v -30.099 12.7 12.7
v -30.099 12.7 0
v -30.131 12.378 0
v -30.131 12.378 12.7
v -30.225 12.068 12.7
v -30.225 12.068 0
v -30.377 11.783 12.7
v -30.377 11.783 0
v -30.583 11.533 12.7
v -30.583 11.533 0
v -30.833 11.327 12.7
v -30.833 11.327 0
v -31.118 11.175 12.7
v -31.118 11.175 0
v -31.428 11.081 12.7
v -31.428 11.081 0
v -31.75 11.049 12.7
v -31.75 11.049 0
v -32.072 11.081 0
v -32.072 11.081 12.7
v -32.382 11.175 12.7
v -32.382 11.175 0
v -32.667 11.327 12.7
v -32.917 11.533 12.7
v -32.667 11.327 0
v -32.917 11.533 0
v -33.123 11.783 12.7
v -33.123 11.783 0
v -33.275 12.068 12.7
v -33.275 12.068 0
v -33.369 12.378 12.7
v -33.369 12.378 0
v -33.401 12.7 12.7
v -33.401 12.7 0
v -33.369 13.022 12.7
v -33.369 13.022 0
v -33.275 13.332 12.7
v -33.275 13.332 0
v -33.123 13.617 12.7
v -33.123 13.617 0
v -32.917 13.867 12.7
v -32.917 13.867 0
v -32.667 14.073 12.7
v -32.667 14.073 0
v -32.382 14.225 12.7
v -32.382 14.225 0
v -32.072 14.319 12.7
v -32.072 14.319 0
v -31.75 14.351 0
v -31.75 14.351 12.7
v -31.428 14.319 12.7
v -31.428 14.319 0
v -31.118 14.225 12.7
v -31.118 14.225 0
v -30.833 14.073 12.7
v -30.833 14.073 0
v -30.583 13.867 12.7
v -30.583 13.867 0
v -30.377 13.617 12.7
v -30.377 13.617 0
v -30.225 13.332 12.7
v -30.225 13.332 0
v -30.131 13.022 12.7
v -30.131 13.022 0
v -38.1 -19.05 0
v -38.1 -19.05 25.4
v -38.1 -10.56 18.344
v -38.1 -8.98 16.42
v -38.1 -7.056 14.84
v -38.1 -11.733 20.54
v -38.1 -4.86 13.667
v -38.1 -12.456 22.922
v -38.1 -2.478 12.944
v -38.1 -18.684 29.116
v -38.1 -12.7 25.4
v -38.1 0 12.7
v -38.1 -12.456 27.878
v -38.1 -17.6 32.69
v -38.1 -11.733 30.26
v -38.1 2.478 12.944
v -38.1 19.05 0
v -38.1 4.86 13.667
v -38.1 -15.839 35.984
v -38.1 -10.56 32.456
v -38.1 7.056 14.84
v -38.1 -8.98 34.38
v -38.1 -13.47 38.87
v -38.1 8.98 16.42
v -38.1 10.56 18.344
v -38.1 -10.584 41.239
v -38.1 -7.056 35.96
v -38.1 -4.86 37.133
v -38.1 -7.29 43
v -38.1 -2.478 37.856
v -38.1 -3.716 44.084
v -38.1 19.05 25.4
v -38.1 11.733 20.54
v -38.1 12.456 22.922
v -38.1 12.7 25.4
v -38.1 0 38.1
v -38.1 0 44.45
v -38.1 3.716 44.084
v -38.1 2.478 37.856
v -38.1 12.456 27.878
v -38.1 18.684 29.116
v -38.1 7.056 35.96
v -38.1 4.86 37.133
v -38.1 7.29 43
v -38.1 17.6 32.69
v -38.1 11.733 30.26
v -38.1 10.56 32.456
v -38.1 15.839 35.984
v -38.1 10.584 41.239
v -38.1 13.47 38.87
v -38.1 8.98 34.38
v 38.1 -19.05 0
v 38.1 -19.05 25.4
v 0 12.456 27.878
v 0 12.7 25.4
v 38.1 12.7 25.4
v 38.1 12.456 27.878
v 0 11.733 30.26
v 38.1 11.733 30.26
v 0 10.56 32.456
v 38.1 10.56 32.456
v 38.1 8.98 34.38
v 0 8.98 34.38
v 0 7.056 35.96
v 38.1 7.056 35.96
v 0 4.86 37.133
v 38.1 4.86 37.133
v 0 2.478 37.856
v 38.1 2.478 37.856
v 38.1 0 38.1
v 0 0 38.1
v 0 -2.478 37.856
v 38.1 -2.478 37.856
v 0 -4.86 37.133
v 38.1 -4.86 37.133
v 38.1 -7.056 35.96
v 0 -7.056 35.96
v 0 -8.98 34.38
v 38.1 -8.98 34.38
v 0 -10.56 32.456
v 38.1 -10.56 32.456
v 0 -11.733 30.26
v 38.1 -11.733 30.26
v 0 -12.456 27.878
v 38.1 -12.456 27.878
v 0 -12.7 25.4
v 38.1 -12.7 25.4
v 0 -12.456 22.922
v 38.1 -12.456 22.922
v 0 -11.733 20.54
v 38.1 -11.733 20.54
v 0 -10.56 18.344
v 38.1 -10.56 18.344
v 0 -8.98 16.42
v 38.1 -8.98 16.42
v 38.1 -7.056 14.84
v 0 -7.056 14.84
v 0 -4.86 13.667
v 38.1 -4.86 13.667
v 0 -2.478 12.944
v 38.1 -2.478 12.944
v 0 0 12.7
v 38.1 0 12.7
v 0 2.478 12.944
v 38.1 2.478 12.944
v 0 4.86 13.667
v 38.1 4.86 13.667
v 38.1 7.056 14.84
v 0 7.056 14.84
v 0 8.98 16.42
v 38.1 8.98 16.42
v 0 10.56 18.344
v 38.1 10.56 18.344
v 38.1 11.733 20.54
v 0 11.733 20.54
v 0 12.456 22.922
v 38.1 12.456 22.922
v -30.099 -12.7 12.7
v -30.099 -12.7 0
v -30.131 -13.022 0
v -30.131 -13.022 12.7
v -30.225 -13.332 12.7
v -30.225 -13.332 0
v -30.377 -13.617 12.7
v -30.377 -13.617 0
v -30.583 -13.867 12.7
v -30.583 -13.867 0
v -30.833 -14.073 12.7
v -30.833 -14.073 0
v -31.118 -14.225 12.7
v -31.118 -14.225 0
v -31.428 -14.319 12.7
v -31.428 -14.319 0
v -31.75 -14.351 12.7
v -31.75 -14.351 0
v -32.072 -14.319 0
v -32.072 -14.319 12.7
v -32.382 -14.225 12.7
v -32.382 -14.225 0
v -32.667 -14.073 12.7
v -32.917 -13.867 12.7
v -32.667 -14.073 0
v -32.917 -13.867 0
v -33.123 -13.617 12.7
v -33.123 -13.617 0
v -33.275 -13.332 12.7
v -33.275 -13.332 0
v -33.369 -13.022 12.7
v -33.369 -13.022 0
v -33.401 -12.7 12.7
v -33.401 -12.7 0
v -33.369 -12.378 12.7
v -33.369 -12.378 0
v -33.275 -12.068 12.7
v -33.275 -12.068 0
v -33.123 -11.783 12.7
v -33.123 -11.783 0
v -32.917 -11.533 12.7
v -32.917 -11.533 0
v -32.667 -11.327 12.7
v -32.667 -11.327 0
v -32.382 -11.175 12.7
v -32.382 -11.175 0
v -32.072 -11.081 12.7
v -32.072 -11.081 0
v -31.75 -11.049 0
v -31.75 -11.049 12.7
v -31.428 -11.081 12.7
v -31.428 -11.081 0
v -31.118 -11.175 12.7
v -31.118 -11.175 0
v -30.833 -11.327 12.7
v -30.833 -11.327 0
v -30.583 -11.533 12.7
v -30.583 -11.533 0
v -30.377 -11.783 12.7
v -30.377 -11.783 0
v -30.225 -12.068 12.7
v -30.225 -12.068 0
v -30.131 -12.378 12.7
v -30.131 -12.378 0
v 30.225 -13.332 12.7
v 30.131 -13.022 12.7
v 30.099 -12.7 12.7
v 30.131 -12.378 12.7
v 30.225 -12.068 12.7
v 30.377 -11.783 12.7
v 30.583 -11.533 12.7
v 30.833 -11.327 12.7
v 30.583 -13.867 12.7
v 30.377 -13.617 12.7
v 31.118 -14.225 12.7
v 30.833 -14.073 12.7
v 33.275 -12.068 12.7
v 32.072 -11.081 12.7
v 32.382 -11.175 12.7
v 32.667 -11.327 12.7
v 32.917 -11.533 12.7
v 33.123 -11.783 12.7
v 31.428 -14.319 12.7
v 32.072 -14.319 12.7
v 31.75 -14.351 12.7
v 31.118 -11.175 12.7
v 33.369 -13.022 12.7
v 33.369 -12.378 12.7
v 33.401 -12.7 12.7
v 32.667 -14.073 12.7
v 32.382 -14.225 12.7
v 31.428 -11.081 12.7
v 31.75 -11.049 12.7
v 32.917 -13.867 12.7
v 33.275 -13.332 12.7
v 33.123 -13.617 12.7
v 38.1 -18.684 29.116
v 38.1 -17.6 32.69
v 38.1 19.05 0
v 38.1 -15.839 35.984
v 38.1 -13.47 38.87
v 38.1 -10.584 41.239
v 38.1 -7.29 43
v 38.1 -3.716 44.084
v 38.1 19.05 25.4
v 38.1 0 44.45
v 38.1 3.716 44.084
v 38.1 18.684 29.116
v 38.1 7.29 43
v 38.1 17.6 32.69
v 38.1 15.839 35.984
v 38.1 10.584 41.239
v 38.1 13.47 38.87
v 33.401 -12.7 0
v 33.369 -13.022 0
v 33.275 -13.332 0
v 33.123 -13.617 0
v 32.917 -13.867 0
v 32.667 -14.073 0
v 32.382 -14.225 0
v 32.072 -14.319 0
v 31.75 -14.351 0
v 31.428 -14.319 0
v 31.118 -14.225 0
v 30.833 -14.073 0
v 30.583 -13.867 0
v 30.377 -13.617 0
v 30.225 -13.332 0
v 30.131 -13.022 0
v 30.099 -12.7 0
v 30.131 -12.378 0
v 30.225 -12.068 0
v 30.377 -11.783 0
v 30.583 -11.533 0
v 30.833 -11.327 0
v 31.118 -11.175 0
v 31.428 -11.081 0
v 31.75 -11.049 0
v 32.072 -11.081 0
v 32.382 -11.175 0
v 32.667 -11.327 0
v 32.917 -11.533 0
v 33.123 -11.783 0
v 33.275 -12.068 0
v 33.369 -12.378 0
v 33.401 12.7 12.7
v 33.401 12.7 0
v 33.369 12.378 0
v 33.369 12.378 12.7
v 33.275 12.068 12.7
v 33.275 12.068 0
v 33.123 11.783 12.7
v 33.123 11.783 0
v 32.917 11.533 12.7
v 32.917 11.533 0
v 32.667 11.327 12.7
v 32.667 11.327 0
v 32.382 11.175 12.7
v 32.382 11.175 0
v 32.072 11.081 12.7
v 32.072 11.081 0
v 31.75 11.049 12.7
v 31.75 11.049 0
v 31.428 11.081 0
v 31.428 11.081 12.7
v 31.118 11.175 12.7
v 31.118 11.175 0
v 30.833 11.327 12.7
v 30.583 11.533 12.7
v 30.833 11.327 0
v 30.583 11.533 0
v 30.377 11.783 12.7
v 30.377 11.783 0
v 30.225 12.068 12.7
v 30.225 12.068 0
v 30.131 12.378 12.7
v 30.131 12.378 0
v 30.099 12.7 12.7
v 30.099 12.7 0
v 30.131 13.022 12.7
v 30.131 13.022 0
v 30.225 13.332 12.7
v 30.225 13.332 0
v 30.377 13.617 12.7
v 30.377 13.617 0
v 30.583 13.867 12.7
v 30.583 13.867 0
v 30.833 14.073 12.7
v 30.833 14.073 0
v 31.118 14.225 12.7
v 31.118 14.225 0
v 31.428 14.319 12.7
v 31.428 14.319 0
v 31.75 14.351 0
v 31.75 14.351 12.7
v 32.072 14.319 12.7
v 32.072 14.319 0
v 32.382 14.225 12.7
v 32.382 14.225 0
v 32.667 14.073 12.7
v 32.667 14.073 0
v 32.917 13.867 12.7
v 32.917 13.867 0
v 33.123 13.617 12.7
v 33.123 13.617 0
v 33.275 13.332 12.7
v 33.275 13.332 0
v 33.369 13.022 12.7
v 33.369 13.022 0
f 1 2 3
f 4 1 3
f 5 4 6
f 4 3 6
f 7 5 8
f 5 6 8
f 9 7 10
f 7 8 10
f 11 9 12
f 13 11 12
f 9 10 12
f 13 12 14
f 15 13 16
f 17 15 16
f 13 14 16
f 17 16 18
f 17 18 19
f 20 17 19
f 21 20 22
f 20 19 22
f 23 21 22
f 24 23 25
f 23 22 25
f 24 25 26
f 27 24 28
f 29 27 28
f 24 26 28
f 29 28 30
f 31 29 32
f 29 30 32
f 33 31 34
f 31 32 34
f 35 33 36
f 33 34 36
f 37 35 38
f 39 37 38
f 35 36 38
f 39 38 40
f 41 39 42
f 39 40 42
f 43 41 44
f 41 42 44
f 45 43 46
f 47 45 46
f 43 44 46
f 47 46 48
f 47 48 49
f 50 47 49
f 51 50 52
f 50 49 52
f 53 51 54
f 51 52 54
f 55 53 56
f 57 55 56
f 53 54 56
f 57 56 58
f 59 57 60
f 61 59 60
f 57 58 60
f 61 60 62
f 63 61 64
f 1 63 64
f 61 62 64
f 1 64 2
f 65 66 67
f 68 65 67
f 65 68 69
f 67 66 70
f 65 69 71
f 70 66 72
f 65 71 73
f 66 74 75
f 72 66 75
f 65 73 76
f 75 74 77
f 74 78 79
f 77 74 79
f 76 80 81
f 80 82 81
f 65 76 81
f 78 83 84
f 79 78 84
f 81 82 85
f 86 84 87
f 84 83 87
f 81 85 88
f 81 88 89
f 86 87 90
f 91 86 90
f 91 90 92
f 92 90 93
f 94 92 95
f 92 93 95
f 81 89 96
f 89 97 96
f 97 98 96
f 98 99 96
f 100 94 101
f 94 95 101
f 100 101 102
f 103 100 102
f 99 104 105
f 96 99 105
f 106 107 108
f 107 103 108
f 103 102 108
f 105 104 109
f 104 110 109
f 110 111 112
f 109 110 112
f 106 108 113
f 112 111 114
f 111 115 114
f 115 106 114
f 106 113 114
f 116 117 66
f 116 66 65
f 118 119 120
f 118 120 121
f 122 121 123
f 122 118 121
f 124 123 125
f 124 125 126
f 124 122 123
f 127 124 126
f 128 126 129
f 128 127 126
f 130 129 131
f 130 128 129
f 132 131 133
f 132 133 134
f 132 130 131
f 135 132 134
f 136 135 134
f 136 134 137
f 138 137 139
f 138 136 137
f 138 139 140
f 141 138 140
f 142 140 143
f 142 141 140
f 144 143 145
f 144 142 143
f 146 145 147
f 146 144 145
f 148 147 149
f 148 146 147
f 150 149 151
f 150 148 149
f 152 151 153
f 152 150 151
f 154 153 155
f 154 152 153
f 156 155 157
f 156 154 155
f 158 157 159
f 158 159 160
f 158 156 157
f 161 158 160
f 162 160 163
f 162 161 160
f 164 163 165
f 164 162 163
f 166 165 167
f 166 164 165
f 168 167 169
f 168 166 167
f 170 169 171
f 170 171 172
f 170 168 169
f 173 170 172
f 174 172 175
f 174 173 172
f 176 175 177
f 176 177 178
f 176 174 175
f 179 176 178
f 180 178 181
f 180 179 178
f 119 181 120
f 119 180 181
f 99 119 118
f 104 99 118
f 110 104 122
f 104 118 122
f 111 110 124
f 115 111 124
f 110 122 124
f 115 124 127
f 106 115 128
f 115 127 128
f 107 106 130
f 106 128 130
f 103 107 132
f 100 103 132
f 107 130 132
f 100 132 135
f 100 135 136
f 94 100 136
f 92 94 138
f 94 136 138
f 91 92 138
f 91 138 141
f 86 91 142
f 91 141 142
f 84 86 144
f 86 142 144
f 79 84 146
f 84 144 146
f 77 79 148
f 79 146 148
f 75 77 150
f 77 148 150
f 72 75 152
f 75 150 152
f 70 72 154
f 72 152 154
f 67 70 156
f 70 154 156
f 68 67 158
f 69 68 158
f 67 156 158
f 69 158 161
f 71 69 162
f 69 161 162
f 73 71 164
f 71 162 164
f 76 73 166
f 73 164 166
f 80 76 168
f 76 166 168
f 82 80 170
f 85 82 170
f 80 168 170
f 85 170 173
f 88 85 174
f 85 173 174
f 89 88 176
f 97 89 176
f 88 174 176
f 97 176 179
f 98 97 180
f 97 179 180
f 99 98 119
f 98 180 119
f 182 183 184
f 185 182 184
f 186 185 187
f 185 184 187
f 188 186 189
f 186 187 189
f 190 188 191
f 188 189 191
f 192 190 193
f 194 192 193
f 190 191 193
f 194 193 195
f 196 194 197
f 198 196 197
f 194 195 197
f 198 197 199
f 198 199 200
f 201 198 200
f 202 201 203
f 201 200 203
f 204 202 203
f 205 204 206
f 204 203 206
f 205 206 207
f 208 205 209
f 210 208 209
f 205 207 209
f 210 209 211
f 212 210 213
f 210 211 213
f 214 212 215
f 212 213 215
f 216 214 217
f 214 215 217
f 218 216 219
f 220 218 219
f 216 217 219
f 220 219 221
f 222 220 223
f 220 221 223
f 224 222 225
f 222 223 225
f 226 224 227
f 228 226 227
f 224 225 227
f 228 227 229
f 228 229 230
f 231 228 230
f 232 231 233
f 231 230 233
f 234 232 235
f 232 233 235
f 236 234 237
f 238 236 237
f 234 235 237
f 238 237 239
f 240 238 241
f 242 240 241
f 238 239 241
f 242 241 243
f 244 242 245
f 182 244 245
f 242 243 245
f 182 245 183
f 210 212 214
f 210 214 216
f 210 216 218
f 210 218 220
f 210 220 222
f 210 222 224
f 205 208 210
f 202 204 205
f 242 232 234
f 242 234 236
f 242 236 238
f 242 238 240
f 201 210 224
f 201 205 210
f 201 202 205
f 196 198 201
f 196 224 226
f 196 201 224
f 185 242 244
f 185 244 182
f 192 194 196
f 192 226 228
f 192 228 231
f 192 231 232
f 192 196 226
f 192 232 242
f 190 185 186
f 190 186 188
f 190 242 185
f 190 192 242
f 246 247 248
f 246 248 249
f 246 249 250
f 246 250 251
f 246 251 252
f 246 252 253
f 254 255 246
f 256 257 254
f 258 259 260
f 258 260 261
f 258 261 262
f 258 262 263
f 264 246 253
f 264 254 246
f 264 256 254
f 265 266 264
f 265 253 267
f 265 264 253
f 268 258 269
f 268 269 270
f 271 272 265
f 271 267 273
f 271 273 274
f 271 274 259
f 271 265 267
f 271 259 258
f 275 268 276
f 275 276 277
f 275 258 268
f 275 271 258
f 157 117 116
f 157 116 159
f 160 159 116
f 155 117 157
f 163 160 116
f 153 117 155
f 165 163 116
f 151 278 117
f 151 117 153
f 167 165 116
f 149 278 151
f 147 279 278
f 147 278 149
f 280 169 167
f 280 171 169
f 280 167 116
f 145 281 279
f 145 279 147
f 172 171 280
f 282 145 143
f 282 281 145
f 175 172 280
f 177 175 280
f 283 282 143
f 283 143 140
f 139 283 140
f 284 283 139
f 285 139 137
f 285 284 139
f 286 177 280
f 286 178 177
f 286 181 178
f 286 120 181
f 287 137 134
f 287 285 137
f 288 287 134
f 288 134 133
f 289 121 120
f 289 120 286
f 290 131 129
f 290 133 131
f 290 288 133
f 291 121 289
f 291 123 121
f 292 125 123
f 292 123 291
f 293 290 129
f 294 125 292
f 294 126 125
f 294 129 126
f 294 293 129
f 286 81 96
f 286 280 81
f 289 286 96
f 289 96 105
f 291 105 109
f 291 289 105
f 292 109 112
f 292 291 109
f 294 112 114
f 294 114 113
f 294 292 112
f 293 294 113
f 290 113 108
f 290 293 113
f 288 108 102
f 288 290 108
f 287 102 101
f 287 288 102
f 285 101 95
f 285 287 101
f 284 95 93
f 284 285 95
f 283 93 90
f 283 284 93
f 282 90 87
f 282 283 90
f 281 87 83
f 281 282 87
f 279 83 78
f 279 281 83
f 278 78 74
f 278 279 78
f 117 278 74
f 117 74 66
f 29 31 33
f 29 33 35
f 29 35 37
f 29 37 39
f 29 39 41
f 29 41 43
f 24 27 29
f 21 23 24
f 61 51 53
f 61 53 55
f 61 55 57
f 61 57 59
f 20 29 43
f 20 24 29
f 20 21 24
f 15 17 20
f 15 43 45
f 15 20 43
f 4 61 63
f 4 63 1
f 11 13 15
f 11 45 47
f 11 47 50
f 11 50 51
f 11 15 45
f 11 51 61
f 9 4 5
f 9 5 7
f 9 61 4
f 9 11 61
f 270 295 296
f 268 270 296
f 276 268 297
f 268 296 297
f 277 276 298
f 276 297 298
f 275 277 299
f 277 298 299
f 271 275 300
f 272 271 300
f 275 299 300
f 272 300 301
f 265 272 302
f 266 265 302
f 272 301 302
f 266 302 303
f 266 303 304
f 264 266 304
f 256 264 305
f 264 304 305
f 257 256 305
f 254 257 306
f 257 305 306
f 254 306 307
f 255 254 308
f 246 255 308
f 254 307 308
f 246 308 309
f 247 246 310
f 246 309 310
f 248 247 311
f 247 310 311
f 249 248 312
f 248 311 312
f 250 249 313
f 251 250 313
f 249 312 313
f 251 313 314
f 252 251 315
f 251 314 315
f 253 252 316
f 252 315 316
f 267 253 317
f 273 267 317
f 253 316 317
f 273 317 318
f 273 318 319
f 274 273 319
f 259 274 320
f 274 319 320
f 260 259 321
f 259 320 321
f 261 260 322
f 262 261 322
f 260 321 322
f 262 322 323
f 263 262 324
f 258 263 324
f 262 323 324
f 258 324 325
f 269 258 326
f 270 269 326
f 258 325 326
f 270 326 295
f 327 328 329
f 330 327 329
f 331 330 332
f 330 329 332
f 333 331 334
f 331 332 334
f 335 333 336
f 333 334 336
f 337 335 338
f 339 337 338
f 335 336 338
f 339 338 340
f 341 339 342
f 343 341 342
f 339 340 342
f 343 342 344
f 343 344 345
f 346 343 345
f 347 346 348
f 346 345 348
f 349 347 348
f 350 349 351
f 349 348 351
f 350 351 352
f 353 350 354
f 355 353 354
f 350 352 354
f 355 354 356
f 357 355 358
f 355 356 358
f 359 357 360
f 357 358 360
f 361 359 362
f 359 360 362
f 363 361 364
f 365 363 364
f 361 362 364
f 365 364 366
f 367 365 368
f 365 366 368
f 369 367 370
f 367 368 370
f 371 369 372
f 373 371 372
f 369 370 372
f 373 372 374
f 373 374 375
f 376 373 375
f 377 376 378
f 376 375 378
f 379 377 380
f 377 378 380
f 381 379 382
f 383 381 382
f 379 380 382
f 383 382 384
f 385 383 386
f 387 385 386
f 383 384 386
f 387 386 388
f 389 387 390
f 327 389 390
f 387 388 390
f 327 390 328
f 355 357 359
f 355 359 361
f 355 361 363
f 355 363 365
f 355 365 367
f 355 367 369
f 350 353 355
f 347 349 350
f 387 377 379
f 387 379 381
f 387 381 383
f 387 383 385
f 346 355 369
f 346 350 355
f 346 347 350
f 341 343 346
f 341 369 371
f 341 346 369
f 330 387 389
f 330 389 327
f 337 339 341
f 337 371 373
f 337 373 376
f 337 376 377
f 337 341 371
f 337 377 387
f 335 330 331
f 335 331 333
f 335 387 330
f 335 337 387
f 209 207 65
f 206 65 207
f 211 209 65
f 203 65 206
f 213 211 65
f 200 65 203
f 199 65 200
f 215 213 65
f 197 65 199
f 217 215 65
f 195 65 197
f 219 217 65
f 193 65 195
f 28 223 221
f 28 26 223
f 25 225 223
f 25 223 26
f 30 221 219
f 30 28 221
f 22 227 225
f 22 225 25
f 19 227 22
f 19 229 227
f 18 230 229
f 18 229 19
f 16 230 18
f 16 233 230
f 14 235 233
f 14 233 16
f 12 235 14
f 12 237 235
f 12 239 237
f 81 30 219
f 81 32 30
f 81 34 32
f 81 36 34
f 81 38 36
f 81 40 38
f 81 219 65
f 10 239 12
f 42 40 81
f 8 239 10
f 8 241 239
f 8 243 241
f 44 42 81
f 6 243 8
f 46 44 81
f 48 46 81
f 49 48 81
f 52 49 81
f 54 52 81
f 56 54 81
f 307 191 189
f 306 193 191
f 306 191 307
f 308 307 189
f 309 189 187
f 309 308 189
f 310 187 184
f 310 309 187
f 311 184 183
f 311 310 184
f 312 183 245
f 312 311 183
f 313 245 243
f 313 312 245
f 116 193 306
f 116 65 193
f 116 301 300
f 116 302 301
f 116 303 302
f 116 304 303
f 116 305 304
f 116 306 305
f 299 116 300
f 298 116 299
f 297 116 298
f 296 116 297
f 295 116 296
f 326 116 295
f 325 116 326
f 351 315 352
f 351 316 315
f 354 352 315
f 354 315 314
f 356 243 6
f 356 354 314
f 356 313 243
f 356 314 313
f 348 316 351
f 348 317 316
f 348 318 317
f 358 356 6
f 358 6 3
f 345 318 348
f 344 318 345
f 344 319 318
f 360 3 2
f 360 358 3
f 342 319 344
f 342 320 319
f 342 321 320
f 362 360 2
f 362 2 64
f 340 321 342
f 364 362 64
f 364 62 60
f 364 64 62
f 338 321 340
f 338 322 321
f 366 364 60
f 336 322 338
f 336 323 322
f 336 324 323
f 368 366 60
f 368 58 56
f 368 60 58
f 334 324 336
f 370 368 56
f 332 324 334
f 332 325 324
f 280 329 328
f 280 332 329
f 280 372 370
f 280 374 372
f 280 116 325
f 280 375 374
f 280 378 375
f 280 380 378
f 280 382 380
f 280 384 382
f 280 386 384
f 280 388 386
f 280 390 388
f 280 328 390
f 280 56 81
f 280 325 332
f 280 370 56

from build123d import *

# Parameters (mm, degrees)
F0_R          = 12.7
F1_DEPTH      = 38.1
F1_DEPTH_BACK = 38.1
F2_R          = 1.651
F3_DEPTH      = 12.7


with BuildPart() as f1:
    # F0 (on Right) → F1 (new body, two sides)
    with BuildSketch(Plane.YZ) as f1_sk:
        with BuildLine():
            Line((19.05, 0), (19.05, 25.4))
            ThreePointArc((19.05, 25.4), (0, 44.45), (-19.05, 25.4))
            Line((-19.05, 25.4), (-19.05, 0))
            Line((-19.05, 0), (19.05, 0))
        make_face()
        with Locations((0, 25.4)):
            Circle(F0_R, mode=Mode.SUBTRACT)
    extrude(amount=F1_DEPTH)
    extrude(f1_sk.sketch, amount=-F1_DEPTH_BACK)

    # F2 (on face) → F3 (cut)
    with BuildSketch(Plane(origin=(0, 0, 0), x_dir=(1, 0, 0), z_dir=(0, 0, -1))):
        with Locations((-31.75, 12.7)):
            Circle(F2_R)
        with Locations((-31.75, -12.7)):
            Circle(F2_R)
        with Locations((31.75, 12.7)):
            Circle(F2_R)
        with Locations((31.75, -12.7)):
            Circle(F2_R)
    extrude(amount=-F3_DEPTH, mode=Mode.SUBTRACT)


solid = f1.part
